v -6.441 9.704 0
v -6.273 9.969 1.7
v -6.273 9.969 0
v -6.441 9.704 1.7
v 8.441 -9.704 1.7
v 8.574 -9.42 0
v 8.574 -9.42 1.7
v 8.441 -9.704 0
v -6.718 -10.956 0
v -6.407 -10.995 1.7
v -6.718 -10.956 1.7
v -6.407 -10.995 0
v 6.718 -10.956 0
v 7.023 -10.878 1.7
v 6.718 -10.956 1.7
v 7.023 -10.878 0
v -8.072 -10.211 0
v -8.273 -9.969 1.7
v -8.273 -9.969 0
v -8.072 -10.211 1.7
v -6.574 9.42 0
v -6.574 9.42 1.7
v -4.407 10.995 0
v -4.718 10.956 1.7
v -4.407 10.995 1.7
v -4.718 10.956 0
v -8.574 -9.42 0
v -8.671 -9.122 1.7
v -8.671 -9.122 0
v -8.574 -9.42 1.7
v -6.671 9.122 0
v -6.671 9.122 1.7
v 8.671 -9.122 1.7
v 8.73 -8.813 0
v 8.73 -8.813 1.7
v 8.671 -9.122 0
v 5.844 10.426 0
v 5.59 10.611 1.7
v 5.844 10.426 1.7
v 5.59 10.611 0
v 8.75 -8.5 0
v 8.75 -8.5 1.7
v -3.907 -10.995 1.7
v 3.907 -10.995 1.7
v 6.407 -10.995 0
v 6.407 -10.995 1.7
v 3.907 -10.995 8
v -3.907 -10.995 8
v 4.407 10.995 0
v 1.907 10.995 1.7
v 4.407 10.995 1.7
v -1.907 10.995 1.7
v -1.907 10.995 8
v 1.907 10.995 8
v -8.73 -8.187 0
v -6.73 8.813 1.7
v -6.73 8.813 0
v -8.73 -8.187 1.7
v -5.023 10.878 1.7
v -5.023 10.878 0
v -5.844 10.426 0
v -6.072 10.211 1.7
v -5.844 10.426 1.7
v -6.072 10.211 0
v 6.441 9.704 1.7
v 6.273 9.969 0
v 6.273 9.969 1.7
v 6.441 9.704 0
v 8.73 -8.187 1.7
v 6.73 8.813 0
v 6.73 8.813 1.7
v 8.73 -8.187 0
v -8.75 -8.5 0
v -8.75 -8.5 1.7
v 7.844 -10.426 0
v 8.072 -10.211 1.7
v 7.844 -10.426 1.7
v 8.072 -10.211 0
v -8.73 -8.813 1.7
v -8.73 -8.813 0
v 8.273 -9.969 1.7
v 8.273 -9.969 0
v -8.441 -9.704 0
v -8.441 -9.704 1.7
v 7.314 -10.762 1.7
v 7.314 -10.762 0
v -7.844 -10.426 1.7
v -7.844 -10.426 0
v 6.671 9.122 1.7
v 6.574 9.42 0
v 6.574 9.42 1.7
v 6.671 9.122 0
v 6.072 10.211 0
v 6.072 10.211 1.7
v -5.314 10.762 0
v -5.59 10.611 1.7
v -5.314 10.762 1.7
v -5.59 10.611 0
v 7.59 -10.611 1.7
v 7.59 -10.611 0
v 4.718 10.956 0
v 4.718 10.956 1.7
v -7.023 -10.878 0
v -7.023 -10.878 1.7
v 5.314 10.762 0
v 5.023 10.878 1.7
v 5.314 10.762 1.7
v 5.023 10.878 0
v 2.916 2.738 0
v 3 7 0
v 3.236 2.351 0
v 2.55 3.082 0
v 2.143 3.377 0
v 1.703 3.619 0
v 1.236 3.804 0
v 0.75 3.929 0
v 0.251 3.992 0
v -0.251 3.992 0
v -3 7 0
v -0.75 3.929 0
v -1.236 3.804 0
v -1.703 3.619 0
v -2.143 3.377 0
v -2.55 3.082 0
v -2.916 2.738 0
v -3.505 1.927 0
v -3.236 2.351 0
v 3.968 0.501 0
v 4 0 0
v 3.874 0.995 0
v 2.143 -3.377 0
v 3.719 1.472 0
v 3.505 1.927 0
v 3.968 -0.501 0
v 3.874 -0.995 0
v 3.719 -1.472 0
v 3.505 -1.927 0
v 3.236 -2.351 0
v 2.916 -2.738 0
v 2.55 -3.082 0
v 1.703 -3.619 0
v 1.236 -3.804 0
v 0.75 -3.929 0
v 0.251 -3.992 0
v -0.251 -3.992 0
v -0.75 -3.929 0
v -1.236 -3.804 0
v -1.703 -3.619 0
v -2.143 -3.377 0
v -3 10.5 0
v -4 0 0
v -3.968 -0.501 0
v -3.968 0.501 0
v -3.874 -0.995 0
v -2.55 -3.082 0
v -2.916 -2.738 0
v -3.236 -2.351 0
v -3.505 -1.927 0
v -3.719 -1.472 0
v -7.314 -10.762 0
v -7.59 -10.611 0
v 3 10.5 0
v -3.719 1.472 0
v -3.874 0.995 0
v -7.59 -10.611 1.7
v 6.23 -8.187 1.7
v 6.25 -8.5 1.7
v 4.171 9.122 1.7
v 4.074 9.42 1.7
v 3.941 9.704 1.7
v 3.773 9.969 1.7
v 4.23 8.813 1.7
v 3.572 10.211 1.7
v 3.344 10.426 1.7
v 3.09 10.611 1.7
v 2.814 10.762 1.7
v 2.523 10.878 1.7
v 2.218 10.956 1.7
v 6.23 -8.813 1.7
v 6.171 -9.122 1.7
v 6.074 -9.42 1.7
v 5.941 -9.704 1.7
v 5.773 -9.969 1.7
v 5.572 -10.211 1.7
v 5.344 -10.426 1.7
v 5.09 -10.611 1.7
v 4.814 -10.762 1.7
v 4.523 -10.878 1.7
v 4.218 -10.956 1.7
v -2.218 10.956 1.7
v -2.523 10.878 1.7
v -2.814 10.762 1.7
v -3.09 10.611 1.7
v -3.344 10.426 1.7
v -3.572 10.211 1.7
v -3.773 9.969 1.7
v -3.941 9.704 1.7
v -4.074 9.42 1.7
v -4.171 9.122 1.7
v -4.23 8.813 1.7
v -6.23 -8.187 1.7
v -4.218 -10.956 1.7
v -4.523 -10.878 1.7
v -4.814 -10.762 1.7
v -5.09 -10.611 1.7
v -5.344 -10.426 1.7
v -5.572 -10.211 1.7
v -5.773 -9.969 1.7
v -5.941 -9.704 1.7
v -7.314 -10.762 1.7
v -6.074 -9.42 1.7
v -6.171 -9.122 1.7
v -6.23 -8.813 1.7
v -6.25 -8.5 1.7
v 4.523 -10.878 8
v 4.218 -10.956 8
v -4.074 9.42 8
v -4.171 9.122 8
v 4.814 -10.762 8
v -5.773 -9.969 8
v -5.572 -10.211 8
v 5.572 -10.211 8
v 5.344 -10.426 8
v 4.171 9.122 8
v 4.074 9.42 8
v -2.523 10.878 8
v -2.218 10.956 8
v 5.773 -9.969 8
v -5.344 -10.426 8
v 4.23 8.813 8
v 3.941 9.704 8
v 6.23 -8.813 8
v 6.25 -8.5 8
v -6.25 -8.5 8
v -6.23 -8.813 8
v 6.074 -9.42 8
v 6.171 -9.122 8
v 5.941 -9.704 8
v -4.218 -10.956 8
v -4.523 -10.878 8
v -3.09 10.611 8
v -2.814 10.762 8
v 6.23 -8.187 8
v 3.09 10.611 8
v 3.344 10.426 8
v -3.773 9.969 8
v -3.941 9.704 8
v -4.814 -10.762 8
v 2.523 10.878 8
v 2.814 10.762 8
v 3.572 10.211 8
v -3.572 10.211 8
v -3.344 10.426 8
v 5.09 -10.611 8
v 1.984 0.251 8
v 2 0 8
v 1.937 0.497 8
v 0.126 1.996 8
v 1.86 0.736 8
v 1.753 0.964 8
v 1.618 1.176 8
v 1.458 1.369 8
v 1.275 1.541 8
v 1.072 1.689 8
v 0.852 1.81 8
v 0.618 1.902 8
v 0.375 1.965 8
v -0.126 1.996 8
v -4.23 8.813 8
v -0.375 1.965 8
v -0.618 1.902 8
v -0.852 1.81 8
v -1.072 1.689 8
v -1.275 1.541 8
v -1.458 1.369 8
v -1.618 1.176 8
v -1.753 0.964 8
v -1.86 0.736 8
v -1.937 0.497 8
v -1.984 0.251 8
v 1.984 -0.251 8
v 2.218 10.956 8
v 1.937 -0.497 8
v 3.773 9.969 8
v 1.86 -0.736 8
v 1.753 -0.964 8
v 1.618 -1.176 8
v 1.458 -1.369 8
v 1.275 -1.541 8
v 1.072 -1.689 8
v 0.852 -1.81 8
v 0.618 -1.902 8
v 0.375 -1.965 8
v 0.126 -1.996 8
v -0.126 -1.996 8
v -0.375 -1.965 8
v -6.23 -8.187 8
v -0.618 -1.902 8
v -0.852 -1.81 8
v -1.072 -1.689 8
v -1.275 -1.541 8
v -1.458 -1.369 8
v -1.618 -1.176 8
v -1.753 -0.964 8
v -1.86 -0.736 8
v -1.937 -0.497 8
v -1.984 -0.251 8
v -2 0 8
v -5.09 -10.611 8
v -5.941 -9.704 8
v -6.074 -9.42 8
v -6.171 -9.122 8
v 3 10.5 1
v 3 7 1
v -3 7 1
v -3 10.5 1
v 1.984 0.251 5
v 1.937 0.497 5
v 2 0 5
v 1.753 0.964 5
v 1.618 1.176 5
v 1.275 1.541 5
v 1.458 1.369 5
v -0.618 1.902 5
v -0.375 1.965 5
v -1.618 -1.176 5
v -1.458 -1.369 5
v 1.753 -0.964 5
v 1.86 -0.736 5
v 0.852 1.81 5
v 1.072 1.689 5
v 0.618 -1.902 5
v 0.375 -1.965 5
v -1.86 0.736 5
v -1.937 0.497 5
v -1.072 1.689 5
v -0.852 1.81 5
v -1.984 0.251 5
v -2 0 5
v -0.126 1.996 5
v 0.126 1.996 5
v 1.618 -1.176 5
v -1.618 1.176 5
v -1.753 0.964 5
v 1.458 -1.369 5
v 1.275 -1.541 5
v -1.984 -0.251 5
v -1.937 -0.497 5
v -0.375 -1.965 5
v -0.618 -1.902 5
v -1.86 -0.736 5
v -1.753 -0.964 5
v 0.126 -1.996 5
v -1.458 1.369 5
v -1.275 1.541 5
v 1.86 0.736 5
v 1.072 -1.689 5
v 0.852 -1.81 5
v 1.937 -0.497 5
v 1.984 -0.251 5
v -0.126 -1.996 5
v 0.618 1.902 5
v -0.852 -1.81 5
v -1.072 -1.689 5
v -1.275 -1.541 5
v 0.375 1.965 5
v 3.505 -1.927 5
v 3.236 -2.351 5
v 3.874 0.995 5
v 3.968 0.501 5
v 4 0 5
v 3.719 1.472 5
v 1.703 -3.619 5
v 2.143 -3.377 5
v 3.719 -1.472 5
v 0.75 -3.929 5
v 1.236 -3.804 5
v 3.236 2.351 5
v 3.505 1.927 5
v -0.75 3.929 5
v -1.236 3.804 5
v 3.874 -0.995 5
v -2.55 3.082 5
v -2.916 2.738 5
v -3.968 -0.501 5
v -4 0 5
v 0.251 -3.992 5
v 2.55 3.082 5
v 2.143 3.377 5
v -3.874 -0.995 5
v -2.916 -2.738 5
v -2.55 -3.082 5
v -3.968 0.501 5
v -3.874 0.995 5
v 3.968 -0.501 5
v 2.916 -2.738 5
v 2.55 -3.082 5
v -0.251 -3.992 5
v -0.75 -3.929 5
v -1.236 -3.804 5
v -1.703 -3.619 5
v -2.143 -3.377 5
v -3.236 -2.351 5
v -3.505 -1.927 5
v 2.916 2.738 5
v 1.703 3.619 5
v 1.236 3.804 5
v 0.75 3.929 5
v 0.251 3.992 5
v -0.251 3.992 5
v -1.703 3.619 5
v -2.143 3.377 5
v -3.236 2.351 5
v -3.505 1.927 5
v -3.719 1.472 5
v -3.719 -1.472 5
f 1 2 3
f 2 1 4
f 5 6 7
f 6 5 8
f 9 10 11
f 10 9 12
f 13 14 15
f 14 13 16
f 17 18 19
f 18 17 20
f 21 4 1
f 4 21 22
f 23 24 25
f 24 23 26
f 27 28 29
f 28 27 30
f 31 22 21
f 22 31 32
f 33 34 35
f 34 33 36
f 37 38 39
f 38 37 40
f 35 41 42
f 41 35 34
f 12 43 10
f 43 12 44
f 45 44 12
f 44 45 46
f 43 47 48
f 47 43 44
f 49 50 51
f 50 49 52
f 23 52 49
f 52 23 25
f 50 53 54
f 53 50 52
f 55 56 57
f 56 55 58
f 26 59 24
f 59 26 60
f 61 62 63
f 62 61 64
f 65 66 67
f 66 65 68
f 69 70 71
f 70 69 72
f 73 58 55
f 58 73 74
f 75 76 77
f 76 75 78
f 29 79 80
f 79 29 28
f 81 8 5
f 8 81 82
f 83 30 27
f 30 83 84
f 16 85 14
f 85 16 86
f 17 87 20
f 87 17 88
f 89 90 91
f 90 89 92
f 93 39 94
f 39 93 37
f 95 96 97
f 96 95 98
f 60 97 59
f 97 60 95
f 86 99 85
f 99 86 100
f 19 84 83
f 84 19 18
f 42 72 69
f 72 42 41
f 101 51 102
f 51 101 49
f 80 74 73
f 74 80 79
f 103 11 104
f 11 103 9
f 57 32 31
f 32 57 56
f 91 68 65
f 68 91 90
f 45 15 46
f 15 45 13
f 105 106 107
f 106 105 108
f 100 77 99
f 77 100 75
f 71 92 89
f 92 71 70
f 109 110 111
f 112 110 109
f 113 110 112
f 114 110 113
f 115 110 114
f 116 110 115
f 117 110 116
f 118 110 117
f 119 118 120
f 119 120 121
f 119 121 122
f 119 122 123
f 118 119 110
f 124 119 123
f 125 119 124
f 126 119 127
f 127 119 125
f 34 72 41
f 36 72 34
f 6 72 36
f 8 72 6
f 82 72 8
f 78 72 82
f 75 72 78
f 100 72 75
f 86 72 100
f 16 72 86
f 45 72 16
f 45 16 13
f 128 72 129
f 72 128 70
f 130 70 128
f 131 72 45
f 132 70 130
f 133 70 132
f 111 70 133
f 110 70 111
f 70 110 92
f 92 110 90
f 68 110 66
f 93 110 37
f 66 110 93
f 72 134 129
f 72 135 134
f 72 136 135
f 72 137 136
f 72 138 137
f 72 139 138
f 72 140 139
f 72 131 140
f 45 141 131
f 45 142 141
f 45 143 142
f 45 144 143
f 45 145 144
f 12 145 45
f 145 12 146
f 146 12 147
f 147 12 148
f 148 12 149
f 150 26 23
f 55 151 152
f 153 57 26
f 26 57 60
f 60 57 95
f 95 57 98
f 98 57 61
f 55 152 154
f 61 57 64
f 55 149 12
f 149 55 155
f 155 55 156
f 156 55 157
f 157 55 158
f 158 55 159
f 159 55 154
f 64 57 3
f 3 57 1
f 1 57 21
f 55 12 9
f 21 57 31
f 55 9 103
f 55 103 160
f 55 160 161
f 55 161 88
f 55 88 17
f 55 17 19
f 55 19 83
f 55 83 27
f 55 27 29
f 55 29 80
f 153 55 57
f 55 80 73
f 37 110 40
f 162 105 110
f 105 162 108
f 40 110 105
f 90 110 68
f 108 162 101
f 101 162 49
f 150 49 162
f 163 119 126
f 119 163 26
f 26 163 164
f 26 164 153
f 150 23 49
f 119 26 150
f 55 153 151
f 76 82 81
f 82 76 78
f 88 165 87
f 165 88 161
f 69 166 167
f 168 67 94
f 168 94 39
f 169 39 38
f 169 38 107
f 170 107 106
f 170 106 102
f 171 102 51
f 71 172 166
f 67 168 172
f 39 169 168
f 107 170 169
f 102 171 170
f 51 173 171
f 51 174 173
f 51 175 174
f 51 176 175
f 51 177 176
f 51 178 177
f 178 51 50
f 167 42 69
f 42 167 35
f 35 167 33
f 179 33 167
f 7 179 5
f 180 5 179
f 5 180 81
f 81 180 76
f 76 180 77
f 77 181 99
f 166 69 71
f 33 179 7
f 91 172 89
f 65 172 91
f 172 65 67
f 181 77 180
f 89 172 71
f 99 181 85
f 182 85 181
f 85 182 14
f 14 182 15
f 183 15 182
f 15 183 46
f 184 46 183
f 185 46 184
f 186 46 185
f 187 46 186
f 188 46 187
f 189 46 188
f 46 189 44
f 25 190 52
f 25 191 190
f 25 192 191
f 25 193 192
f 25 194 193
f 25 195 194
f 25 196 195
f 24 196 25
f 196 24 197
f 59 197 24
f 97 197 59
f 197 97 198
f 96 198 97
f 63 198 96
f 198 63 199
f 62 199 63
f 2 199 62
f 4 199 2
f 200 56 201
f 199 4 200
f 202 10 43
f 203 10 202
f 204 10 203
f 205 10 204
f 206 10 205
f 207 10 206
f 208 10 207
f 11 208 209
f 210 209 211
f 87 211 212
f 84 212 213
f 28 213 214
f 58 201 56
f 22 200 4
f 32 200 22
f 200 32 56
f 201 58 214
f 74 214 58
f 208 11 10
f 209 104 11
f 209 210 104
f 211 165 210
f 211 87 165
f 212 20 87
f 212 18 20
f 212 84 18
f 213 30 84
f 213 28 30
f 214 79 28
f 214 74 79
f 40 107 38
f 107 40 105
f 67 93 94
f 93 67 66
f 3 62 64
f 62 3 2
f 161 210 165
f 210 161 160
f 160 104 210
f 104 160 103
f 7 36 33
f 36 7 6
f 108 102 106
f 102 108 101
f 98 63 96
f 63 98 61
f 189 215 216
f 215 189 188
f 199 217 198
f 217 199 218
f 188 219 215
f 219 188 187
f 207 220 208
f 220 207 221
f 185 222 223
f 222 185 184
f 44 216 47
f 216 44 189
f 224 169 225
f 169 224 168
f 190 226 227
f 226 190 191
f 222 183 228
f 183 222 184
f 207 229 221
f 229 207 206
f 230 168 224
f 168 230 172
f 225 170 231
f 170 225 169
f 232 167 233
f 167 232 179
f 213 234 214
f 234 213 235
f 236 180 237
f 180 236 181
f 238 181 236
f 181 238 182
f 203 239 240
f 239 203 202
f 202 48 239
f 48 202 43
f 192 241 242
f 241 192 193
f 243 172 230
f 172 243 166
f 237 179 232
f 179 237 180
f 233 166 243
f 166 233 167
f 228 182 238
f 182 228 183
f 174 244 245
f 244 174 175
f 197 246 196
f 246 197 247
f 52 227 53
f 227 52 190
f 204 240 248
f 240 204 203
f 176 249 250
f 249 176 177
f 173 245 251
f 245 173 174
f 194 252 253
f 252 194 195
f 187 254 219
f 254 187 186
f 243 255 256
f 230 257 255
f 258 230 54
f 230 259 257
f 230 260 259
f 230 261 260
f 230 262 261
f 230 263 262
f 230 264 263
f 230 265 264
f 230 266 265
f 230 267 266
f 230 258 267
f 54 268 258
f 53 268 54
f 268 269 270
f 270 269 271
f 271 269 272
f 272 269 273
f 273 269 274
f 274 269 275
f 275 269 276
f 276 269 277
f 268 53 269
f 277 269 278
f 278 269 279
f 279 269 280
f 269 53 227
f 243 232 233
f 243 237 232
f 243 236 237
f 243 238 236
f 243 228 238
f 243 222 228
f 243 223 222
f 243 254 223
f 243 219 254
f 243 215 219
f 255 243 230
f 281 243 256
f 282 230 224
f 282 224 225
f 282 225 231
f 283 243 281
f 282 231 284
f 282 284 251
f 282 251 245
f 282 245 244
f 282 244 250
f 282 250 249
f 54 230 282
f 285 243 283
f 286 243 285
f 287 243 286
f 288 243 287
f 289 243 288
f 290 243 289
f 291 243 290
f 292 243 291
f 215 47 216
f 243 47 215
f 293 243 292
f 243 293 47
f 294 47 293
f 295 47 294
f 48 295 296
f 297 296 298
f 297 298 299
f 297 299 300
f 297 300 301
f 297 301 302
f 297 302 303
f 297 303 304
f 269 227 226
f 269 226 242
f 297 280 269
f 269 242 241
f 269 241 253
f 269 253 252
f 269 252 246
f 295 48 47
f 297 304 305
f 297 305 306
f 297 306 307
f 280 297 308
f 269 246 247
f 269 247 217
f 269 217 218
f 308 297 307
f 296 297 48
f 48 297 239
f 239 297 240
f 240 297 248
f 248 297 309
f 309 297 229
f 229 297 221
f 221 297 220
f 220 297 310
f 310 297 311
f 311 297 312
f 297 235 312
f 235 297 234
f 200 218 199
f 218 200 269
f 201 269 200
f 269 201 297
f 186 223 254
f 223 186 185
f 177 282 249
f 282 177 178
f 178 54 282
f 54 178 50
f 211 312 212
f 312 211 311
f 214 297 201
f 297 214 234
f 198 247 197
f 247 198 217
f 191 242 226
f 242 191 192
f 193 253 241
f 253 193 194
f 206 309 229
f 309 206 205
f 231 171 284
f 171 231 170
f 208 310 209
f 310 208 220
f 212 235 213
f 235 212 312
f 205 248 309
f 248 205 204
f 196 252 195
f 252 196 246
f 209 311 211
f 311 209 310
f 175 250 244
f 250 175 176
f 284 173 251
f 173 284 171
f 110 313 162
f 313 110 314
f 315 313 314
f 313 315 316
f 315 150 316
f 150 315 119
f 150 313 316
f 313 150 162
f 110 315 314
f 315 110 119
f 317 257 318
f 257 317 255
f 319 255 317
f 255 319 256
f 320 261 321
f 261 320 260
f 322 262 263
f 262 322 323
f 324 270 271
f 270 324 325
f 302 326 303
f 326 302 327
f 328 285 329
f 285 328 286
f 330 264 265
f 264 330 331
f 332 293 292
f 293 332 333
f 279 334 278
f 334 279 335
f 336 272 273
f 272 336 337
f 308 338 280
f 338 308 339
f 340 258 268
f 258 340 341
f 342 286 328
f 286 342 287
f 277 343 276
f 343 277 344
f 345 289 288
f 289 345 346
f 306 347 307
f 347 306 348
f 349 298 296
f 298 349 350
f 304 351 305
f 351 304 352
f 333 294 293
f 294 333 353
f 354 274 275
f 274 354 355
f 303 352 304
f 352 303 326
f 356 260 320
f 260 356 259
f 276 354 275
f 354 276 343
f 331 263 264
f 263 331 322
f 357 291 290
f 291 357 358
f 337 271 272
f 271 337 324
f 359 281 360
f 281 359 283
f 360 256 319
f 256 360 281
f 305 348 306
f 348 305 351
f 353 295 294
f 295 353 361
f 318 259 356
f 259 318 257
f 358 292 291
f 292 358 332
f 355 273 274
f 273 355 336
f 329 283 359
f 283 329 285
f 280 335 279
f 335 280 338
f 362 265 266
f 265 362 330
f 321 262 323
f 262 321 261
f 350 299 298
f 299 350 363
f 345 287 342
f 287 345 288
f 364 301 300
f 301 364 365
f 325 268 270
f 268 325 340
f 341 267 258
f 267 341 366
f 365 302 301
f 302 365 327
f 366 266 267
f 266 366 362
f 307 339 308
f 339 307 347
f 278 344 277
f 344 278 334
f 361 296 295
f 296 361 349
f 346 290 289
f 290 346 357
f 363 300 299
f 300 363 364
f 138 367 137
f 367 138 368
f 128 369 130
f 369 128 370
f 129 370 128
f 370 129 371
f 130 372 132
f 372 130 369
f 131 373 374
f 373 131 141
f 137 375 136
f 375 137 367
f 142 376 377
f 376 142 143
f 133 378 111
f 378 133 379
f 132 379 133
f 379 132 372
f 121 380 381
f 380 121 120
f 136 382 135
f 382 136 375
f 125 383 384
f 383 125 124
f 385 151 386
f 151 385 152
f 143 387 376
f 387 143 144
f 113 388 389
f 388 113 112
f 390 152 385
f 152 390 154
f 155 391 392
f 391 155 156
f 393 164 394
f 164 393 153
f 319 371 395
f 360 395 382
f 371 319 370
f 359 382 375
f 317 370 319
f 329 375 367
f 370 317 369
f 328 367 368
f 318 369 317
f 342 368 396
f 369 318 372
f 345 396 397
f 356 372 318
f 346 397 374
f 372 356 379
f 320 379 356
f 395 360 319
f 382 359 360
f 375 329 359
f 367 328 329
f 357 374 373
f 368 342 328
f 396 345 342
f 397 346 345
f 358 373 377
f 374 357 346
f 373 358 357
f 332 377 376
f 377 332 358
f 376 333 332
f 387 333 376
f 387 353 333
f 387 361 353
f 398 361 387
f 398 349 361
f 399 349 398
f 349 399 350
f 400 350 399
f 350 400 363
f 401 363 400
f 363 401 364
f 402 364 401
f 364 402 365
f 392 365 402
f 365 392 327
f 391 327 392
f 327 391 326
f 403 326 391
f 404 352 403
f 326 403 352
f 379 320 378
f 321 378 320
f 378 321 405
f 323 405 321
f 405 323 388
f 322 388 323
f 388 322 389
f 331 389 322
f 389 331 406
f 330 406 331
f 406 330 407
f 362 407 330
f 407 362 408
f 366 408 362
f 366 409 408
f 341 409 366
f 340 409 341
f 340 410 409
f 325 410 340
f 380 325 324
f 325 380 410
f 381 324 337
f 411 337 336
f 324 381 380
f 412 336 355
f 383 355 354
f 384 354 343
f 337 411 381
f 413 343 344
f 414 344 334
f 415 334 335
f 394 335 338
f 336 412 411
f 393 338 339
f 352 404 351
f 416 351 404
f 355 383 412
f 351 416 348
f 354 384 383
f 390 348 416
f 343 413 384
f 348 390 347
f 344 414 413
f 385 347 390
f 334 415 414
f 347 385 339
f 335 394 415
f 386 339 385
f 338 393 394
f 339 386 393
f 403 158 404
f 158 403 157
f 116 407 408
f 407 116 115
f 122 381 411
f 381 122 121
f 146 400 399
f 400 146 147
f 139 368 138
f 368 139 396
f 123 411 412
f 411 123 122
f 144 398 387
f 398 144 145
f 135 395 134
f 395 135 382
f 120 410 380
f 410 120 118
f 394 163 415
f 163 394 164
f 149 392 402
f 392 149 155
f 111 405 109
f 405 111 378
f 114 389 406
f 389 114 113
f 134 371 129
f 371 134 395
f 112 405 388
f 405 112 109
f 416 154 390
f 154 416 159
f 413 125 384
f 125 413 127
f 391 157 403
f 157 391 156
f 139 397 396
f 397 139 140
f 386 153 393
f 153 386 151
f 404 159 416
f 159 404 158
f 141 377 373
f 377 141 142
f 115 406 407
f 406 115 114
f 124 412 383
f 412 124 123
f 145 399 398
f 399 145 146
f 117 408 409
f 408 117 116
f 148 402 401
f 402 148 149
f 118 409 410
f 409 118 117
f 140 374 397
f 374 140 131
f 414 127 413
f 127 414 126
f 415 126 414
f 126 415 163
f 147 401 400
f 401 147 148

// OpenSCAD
LENGTH = 22;
FRONT_WIDTH = 13.5;
BACK_WIDTH = 17.5;
THICKNESS = 1.7;
LIP = 2.5;
CORNER_DIA = 5;
HEIGHT = 8;

SCREW_DIA = 4;
SCREW_HEAD_DIA = 8;
SCREW_HEAD_LENGTH = 5;

NOTCH_WIDTH = 6;
NOTCH_LENGTH = 3.5;
NOTCH_OFFSET = 0.5;
NOTCH_DEPTH = 1;

$fn = 50;

module slide(front_width, back_width, length, thickness, corner_dia) {
    hull() {
        fw = front_width - corner_dia;
        bw = back_width - corner_dia;
        l = length - corner_dia;
        translate([-fw/2, l/2, 0])
        cylinder(d = corner_dia, h = thickness);

        translate([fw/2, l/2, 0])
        cylinder(d = corner_dia, h = thickness);

        translate([-bw/2, -l/2, 0])
        cylinder(d = corner_dia, h = thickness);

        translate([bw/2, -l/2, 0])
        cylinder(d = corner_dia, h = thickness);
    }
}

difference() {
    union() {
        slide(FRONT_WIDTH, BACK_WIDTH, LENGTH, THICKNESS, CORNER_DIA);
        slide(FRONT_WIDTH - 2 * LIP, BACK_WIDTH - 2 * LIP, LENGTH, HEIGHT, CORNER_DIA);
    }

    translate([0, LENGTH/2 - NOTCH_LENGTH/2 - NOTCH_OFFSET, 0])
    cube(size = [NOTCH_WIDTH, NOTCH_LENGTH, NOTCH_DEPTH * 2], center = true);

    cylinder(d = SCREW_DIA, h = HEIGHT);
    cylinder(d = SCREW_HEAD_DIA, h = SCREW_HEAD_LENGTH);
}
